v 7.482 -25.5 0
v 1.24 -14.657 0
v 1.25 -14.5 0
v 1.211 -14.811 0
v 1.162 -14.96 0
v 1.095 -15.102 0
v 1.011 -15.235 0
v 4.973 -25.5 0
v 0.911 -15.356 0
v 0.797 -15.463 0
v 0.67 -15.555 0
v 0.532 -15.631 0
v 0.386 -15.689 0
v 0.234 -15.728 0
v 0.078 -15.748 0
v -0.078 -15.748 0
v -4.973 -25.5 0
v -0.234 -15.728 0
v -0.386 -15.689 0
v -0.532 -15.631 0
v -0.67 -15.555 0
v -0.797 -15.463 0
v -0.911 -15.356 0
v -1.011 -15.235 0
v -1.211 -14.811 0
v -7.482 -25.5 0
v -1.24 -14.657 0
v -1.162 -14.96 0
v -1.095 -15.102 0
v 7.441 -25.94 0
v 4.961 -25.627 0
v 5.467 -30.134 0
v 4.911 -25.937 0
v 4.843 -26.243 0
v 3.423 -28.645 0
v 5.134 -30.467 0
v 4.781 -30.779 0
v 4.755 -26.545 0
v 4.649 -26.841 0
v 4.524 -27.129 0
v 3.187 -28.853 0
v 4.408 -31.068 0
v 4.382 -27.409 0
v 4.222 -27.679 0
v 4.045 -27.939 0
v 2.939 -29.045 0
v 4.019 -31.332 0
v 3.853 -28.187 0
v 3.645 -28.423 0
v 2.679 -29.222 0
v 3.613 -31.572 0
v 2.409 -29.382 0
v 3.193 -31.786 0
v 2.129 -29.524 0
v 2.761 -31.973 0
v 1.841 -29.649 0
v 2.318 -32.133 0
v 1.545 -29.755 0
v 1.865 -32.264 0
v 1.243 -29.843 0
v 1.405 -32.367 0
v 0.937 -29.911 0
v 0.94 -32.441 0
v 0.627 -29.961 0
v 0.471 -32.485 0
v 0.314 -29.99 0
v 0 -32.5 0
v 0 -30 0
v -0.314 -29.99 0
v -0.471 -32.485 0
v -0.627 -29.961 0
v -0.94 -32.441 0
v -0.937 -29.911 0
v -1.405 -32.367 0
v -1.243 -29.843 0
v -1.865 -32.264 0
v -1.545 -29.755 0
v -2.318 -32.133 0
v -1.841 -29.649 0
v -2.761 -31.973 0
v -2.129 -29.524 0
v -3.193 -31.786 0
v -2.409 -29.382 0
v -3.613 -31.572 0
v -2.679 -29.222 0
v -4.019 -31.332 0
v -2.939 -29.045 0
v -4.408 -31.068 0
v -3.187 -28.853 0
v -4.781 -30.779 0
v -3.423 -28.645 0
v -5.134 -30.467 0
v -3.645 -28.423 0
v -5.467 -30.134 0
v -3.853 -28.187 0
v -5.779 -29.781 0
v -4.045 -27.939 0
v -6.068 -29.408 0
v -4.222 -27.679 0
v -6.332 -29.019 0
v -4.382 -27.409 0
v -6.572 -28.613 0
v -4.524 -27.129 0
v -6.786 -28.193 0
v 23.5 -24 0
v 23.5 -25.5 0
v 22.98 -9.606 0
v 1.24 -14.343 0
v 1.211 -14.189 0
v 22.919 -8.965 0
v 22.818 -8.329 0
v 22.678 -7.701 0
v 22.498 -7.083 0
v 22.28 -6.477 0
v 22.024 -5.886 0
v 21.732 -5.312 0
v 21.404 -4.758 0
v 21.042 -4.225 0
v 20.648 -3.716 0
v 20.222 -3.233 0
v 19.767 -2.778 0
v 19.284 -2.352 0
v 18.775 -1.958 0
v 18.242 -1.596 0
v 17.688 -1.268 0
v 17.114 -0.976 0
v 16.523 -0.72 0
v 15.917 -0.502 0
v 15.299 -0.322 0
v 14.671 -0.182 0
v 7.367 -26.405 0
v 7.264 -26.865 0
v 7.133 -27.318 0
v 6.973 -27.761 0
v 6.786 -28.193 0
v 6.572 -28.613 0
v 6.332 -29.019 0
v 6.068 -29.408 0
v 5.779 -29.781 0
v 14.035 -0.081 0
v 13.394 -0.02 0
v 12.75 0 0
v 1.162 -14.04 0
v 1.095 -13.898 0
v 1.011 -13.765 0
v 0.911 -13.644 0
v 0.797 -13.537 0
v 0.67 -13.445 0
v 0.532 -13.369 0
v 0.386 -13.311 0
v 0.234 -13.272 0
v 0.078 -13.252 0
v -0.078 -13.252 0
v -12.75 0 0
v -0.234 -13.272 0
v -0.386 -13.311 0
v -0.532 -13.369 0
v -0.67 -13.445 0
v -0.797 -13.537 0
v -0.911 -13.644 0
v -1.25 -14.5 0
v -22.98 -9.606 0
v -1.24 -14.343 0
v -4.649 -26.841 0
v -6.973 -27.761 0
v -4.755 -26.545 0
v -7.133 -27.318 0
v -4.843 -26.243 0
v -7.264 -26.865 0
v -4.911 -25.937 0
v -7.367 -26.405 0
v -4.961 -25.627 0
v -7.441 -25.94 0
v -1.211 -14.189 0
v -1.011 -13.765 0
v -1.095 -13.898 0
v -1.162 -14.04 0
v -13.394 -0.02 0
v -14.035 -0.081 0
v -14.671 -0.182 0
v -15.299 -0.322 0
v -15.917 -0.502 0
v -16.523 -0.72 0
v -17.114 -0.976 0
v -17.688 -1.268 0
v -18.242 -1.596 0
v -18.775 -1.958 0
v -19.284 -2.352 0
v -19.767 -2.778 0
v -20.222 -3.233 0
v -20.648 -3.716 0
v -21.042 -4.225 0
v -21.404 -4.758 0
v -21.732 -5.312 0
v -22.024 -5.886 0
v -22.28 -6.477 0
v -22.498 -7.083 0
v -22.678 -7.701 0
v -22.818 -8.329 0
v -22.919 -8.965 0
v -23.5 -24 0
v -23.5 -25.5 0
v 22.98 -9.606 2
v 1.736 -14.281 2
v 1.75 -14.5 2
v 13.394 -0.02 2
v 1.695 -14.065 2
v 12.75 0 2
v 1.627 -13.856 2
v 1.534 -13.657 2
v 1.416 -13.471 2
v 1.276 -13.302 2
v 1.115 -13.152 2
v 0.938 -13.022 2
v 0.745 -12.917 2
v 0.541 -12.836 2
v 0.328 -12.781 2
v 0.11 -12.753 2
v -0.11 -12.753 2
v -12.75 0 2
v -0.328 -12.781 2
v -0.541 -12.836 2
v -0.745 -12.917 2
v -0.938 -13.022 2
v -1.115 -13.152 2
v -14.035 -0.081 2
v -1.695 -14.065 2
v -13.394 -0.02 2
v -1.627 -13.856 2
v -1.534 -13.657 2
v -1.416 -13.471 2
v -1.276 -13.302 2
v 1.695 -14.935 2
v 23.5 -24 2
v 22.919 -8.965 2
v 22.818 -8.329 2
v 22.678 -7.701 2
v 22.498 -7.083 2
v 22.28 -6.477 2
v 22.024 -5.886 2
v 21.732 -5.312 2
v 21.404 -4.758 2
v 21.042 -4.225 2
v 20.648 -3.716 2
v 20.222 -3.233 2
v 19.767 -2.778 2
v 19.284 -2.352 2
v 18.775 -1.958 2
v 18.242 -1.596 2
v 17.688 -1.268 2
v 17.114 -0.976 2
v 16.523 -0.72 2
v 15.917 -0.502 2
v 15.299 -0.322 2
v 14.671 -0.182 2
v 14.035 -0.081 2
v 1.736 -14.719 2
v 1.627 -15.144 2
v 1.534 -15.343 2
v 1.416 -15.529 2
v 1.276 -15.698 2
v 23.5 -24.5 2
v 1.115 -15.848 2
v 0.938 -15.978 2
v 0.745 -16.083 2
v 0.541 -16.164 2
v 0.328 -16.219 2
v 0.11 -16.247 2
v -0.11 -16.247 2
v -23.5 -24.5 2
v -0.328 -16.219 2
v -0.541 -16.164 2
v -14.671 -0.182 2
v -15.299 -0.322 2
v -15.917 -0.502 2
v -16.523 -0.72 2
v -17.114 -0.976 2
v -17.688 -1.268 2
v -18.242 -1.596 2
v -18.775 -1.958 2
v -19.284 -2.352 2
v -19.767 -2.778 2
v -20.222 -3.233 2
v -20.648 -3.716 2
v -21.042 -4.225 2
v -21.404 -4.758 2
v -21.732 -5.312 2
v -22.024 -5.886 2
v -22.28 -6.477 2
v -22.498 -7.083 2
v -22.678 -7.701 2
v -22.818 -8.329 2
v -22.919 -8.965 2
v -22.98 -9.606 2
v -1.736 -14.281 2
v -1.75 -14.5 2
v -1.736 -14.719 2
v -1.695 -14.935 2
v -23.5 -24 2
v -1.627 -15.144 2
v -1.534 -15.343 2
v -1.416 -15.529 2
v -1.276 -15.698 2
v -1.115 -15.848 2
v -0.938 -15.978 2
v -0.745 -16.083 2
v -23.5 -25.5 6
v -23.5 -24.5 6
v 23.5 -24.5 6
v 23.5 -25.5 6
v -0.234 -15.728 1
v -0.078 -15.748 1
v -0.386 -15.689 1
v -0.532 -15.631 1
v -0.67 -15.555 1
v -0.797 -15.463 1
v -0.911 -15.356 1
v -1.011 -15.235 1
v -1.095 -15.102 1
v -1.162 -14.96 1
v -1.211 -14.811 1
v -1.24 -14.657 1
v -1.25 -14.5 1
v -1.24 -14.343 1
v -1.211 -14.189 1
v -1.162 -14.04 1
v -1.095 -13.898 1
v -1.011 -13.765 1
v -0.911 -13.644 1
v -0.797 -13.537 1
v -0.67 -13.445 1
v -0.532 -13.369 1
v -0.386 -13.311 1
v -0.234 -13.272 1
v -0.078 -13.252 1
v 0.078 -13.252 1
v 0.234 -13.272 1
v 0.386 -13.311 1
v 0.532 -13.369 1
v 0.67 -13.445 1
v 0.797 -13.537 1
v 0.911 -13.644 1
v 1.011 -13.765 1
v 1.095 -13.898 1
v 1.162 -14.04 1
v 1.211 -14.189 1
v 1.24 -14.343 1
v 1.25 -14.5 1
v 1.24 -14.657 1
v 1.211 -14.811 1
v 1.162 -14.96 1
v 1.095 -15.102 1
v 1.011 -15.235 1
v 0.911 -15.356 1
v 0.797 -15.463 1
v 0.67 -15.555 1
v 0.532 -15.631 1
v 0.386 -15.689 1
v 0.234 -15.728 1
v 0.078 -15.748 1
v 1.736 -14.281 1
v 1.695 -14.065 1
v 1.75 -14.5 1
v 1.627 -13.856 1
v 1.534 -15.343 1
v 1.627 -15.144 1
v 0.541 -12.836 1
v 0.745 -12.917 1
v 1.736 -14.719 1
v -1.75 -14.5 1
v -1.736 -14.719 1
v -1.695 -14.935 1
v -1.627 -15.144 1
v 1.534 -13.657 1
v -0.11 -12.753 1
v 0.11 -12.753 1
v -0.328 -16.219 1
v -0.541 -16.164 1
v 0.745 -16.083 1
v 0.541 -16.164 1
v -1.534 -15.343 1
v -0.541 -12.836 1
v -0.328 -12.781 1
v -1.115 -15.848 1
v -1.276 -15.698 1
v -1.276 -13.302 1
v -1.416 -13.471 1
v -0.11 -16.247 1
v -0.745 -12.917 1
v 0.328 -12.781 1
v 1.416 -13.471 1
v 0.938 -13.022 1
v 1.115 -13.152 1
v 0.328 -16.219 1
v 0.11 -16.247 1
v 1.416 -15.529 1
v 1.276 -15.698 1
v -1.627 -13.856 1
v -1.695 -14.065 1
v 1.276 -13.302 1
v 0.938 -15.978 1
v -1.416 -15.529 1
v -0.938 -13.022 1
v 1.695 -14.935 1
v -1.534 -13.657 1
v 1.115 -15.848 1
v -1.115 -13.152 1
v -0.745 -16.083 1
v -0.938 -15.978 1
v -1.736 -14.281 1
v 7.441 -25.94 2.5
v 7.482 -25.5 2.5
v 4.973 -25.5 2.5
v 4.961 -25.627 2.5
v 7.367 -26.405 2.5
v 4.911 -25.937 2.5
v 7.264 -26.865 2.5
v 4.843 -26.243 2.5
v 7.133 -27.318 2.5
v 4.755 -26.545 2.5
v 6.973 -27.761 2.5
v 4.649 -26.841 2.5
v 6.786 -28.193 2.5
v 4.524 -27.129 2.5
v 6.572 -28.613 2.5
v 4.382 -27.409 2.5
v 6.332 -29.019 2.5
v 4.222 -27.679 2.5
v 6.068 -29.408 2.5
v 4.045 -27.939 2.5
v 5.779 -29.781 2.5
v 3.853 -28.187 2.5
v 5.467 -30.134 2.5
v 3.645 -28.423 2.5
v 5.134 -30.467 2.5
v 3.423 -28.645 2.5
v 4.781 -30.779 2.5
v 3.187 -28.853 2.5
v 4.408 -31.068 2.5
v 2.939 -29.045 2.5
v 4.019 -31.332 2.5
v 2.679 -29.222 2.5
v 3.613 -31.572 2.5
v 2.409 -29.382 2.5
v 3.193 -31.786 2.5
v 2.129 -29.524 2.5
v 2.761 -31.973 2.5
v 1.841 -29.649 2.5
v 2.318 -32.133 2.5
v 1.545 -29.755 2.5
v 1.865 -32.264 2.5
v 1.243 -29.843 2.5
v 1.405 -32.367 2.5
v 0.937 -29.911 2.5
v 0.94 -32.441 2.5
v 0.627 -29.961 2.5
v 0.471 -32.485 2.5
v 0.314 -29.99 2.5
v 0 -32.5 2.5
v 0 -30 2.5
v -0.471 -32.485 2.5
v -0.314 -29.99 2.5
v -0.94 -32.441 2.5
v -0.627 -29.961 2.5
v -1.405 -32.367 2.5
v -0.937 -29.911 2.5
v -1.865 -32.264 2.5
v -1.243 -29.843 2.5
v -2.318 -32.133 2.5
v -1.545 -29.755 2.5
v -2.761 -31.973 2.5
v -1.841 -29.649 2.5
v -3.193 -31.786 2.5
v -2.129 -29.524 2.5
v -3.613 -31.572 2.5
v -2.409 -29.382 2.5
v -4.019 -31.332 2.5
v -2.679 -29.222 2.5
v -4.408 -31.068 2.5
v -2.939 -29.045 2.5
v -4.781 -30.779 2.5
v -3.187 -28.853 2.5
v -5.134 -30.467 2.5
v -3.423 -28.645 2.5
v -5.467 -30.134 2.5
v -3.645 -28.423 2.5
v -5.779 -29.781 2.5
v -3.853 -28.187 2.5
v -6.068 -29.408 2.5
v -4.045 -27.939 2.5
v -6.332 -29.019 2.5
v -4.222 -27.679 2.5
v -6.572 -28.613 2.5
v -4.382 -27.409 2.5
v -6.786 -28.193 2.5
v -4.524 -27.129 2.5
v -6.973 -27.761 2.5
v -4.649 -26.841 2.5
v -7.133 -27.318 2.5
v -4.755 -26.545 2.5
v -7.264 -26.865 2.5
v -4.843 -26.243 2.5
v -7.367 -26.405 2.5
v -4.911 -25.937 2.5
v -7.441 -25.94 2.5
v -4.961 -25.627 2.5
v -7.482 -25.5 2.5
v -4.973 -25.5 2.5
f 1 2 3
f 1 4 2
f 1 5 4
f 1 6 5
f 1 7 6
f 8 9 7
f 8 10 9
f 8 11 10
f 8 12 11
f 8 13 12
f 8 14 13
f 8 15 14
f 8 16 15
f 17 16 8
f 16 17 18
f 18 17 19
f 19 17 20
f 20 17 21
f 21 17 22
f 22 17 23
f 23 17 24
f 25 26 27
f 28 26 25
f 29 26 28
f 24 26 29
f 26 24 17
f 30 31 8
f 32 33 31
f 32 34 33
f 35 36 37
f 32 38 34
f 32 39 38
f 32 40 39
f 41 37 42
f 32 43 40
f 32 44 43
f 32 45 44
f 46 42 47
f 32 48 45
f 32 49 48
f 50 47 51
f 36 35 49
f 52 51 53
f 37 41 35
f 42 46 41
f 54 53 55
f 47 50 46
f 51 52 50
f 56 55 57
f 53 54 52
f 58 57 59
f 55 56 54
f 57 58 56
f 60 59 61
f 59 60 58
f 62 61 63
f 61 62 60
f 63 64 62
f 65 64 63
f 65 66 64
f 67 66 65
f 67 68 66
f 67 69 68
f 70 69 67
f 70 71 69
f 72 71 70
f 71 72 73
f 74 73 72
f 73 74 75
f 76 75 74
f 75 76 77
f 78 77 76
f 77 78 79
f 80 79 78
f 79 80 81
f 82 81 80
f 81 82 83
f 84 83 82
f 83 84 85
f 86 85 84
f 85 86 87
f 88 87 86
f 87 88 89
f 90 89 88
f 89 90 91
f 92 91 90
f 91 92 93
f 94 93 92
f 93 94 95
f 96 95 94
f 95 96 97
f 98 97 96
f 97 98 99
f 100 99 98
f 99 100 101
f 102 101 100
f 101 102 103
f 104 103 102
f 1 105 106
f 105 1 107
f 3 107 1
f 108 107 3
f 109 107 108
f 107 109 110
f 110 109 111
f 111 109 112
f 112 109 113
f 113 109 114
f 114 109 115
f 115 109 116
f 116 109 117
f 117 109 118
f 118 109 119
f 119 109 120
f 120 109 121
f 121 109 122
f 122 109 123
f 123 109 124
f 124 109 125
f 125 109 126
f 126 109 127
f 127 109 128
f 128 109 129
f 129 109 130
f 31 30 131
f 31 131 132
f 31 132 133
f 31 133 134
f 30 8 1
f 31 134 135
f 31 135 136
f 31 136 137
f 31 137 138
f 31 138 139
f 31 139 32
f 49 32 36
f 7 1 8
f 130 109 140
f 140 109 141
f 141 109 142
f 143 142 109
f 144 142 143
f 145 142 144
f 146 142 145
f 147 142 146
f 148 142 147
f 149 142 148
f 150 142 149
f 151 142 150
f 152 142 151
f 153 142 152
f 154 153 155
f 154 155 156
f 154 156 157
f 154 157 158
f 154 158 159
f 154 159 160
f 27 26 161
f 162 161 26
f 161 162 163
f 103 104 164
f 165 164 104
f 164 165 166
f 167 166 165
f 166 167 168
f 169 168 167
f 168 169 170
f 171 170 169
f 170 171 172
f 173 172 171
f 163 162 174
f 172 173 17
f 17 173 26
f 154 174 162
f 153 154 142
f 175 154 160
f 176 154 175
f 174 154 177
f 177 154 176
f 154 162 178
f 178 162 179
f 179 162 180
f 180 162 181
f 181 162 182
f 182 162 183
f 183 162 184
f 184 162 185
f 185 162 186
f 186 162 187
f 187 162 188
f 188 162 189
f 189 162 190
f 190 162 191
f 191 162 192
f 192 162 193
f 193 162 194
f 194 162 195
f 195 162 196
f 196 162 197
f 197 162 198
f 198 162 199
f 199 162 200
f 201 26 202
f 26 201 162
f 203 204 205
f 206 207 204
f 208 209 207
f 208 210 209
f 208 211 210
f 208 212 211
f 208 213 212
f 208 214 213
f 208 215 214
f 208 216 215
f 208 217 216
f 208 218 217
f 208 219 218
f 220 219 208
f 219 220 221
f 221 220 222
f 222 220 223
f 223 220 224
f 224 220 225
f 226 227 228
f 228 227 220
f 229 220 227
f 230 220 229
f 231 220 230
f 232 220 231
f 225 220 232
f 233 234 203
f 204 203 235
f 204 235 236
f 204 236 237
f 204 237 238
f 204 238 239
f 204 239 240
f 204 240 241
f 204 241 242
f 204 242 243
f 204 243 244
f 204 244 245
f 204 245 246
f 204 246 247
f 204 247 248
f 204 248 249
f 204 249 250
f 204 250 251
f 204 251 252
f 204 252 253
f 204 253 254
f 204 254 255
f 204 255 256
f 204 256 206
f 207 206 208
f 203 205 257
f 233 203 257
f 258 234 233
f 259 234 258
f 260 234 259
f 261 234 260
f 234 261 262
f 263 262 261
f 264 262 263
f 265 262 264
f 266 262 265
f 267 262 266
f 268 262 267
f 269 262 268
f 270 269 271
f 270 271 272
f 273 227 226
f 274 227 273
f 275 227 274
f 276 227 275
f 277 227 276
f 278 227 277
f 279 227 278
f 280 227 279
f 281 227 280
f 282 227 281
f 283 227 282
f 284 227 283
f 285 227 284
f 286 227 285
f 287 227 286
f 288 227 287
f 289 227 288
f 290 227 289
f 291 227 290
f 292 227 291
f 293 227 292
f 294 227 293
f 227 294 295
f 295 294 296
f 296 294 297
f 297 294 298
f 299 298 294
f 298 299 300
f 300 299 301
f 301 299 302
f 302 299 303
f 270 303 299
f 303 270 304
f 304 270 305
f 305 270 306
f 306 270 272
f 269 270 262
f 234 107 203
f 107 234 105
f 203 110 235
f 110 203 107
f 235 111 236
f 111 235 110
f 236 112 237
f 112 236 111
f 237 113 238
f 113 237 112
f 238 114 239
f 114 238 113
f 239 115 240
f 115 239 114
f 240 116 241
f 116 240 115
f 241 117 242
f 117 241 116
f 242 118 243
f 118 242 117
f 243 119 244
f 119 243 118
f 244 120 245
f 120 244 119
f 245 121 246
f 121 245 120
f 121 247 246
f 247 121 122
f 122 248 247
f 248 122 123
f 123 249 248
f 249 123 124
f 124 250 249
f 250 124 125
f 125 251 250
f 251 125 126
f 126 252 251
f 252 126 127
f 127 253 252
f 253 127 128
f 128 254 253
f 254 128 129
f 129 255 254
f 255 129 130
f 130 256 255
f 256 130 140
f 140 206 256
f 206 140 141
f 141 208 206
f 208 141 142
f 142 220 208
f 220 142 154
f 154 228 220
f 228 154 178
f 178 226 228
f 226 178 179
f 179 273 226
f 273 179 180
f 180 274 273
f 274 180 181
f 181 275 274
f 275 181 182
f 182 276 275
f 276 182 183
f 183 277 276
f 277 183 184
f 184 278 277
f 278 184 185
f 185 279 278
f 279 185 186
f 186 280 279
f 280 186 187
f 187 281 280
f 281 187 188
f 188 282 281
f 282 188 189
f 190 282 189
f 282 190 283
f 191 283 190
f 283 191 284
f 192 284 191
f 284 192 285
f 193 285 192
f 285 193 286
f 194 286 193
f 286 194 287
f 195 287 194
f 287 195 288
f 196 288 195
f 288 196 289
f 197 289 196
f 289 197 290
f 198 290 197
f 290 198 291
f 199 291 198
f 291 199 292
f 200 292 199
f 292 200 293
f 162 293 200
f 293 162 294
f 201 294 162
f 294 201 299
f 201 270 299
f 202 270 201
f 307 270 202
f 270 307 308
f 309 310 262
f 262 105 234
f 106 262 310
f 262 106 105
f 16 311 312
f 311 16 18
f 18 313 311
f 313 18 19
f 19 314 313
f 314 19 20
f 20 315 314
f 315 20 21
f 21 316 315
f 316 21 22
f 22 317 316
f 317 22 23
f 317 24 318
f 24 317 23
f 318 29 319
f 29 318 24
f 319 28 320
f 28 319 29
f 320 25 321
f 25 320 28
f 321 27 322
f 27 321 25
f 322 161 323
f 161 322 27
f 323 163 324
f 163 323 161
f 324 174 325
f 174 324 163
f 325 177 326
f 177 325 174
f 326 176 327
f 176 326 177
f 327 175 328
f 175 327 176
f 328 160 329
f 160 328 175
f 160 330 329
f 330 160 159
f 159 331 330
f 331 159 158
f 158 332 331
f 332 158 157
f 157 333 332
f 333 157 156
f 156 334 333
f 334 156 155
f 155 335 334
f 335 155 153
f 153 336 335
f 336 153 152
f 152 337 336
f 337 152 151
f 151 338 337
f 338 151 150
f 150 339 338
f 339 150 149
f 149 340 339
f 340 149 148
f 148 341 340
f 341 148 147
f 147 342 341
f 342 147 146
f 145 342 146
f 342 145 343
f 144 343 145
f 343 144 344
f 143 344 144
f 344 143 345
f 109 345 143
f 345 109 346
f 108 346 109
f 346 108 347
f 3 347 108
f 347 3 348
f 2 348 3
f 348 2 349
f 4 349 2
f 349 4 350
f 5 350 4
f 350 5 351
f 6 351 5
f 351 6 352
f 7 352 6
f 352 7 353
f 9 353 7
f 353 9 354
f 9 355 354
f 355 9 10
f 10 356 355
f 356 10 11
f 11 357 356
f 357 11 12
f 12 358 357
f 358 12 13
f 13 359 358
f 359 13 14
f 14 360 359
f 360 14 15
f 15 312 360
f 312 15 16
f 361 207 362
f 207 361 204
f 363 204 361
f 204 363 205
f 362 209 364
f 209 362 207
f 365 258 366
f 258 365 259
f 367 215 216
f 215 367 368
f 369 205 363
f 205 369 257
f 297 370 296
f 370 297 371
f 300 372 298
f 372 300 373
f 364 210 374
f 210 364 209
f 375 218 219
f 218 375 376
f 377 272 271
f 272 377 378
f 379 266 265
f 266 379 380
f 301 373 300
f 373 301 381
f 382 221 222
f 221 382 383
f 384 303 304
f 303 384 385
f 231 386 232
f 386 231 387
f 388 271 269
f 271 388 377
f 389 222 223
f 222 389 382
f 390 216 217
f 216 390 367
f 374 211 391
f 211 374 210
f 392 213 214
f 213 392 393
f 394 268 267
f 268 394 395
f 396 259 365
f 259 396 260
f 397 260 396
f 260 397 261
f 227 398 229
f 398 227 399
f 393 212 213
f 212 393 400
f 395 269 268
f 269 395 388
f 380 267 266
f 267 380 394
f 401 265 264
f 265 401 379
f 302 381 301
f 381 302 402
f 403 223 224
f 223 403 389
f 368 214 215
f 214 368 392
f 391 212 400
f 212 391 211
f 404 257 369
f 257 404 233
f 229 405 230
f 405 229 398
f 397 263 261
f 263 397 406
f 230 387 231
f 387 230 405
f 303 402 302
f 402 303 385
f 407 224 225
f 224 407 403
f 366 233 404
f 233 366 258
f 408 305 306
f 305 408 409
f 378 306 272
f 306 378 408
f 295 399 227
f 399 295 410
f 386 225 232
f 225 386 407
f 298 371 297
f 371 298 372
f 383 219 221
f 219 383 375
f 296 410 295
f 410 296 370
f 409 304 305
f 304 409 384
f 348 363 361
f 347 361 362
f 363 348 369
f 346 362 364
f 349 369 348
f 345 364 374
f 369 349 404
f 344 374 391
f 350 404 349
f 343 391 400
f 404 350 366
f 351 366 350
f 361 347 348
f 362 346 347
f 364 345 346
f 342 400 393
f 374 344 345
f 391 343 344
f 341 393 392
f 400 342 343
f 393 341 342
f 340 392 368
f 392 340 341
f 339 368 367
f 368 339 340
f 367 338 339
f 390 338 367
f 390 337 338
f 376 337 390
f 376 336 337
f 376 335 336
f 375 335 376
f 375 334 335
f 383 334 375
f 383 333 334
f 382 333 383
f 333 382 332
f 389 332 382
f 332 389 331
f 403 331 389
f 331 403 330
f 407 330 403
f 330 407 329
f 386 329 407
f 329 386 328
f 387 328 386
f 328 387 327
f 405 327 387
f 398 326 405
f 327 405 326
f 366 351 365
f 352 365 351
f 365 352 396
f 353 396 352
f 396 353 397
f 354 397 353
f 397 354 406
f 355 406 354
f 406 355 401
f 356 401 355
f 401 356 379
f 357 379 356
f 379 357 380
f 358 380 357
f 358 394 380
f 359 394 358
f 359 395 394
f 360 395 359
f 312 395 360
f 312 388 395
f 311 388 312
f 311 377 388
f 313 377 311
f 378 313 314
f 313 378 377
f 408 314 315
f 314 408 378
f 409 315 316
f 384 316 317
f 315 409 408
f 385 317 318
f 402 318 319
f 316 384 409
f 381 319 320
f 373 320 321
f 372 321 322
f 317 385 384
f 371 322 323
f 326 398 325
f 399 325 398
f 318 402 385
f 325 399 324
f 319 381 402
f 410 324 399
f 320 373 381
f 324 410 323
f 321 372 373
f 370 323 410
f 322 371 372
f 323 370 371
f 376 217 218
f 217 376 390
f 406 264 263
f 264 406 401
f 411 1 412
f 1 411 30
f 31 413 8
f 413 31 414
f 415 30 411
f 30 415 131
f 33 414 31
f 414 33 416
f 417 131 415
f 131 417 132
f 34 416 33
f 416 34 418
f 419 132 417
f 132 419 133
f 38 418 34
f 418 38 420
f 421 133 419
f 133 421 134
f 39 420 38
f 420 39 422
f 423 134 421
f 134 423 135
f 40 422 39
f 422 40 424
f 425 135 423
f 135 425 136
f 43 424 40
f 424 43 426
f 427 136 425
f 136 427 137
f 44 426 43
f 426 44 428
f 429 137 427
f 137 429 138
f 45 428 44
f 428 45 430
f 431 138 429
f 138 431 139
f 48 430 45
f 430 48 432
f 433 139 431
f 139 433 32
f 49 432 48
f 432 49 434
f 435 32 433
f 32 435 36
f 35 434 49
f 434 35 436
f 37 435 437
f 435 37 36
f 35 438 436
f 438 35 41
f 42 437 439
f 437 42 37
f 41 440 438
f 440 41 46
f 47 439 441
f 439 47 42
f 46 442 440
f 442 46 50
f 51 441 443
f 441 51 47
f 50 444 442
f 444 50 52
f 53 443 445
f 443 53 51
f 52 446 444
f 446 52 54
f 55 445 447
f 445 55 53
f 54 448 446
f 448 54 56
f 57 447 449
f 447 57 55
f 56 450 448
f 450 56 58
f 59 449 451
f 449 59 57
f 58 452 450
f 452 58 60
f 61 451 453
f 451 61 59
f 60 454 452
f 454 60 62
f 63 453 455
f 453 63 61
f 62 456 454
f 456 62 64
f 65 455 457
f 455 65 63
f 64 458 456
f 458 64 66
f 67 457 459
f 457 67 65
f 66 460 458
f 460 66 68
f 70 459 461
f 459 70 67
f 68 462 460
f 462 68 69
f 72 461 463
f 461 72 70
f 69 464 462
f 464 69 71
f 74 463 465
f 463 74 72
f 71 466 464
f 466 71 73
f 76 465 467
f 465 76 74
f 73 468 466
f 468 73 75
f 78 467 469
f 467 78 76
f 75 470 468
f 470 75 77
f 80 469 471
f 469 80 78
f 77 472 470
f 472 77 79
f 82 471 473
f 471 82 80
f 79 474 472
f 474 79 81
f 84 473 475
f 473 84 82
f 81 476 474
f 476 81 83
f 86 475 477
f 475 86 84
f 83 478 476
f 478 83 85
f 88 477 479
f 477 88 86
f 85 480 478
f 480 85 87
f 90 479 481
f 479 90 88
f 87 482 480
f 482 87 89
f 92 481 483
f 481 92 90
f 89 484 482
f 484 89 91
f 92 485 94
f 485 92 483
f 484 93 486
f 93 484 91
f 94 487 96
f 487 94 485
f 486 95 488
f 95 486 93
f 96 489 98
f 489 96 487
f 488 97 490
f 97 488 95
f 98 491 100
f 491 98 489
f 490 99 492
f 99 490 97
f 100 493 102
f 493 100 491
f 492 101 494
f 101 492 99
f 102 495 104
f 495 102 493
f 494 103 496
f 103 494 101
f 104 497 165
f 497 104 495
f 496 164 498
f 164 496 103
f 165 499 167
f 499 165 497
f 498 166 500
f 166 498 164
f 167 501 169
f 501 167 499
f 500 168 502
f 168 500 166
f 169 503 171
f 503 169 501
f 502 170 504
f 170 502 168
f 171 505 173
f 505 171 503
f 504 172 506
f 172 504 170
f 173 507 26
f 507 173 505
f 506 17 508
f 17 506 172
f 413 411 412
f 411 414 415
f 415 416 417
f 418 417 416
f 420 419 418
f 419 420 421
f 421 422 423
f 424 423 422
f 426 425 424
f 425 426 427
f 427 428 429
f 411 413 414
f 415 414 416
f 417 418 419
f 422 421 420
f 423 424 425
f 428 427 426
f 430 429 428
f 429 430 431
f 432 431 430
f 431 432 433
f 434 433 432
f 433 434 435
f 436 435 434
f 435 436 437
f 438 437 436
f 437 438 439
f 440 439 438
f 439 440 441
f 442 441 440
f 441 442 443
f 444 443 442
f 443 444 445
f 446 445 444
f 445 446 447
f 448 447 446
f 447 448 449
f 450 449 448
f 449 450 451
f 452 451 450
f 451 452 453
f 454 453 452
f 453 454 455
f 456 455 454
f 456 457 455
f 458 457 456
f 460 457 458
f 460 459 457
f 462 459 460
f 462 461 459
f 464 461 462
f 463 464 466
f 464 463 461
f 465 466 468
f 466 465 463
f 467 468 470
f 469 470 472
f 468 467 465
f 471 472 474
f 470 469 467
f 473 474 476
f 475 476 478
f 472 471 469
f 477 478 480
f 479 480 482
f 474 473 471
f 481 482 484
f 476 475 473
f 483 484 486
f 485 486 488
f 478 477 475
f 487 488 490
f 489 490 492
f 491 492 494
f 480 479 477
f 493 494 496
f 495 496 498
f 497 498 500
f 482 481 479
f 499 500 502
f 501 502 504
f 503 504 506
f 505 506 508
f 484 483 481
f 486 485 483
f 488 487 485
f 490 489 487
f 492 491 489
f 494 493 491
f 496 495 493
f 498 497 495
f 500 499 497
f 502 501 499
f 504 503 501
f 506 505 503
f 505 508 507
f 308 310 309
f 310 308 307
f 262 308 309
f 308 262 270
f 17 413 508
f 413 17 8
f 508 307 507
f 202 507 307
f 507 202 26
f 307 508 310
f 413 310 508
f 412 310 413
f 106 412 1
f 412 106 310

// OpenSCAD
size_x=47;
hole_off=14.5;
circle_dist=26.5;
radius=(size_x-circle_dist)/2;
size_y=25;

difference(){
linear_extrude(height=2)difference(){
	hull()union(){
		for(i=[-1,1]) {
			translate([i*(size_x-2*radius)/2-i*0.5,-radius])circle(r=radius,$fn=100);
		}
		translate([0,-24.5])square([size_x,1],center=true);
	}
	translate([0,-hole_off])circle(d=2.5,$fn=50);
}
translate([0,-hole_off,1])cylinder(r=3.5/2,$fn=50);
}
linear_extrude(height=6)translate([0,-25])square([size_x,1],center=true);

module ring(){
	intersection() {
		rotate_extrude($fn=100)translate([5,0])square([2.5,2.5]);
		translate([-50,-100])cube([100,100,10]);
	}
}

translate([0,-25])ring();
